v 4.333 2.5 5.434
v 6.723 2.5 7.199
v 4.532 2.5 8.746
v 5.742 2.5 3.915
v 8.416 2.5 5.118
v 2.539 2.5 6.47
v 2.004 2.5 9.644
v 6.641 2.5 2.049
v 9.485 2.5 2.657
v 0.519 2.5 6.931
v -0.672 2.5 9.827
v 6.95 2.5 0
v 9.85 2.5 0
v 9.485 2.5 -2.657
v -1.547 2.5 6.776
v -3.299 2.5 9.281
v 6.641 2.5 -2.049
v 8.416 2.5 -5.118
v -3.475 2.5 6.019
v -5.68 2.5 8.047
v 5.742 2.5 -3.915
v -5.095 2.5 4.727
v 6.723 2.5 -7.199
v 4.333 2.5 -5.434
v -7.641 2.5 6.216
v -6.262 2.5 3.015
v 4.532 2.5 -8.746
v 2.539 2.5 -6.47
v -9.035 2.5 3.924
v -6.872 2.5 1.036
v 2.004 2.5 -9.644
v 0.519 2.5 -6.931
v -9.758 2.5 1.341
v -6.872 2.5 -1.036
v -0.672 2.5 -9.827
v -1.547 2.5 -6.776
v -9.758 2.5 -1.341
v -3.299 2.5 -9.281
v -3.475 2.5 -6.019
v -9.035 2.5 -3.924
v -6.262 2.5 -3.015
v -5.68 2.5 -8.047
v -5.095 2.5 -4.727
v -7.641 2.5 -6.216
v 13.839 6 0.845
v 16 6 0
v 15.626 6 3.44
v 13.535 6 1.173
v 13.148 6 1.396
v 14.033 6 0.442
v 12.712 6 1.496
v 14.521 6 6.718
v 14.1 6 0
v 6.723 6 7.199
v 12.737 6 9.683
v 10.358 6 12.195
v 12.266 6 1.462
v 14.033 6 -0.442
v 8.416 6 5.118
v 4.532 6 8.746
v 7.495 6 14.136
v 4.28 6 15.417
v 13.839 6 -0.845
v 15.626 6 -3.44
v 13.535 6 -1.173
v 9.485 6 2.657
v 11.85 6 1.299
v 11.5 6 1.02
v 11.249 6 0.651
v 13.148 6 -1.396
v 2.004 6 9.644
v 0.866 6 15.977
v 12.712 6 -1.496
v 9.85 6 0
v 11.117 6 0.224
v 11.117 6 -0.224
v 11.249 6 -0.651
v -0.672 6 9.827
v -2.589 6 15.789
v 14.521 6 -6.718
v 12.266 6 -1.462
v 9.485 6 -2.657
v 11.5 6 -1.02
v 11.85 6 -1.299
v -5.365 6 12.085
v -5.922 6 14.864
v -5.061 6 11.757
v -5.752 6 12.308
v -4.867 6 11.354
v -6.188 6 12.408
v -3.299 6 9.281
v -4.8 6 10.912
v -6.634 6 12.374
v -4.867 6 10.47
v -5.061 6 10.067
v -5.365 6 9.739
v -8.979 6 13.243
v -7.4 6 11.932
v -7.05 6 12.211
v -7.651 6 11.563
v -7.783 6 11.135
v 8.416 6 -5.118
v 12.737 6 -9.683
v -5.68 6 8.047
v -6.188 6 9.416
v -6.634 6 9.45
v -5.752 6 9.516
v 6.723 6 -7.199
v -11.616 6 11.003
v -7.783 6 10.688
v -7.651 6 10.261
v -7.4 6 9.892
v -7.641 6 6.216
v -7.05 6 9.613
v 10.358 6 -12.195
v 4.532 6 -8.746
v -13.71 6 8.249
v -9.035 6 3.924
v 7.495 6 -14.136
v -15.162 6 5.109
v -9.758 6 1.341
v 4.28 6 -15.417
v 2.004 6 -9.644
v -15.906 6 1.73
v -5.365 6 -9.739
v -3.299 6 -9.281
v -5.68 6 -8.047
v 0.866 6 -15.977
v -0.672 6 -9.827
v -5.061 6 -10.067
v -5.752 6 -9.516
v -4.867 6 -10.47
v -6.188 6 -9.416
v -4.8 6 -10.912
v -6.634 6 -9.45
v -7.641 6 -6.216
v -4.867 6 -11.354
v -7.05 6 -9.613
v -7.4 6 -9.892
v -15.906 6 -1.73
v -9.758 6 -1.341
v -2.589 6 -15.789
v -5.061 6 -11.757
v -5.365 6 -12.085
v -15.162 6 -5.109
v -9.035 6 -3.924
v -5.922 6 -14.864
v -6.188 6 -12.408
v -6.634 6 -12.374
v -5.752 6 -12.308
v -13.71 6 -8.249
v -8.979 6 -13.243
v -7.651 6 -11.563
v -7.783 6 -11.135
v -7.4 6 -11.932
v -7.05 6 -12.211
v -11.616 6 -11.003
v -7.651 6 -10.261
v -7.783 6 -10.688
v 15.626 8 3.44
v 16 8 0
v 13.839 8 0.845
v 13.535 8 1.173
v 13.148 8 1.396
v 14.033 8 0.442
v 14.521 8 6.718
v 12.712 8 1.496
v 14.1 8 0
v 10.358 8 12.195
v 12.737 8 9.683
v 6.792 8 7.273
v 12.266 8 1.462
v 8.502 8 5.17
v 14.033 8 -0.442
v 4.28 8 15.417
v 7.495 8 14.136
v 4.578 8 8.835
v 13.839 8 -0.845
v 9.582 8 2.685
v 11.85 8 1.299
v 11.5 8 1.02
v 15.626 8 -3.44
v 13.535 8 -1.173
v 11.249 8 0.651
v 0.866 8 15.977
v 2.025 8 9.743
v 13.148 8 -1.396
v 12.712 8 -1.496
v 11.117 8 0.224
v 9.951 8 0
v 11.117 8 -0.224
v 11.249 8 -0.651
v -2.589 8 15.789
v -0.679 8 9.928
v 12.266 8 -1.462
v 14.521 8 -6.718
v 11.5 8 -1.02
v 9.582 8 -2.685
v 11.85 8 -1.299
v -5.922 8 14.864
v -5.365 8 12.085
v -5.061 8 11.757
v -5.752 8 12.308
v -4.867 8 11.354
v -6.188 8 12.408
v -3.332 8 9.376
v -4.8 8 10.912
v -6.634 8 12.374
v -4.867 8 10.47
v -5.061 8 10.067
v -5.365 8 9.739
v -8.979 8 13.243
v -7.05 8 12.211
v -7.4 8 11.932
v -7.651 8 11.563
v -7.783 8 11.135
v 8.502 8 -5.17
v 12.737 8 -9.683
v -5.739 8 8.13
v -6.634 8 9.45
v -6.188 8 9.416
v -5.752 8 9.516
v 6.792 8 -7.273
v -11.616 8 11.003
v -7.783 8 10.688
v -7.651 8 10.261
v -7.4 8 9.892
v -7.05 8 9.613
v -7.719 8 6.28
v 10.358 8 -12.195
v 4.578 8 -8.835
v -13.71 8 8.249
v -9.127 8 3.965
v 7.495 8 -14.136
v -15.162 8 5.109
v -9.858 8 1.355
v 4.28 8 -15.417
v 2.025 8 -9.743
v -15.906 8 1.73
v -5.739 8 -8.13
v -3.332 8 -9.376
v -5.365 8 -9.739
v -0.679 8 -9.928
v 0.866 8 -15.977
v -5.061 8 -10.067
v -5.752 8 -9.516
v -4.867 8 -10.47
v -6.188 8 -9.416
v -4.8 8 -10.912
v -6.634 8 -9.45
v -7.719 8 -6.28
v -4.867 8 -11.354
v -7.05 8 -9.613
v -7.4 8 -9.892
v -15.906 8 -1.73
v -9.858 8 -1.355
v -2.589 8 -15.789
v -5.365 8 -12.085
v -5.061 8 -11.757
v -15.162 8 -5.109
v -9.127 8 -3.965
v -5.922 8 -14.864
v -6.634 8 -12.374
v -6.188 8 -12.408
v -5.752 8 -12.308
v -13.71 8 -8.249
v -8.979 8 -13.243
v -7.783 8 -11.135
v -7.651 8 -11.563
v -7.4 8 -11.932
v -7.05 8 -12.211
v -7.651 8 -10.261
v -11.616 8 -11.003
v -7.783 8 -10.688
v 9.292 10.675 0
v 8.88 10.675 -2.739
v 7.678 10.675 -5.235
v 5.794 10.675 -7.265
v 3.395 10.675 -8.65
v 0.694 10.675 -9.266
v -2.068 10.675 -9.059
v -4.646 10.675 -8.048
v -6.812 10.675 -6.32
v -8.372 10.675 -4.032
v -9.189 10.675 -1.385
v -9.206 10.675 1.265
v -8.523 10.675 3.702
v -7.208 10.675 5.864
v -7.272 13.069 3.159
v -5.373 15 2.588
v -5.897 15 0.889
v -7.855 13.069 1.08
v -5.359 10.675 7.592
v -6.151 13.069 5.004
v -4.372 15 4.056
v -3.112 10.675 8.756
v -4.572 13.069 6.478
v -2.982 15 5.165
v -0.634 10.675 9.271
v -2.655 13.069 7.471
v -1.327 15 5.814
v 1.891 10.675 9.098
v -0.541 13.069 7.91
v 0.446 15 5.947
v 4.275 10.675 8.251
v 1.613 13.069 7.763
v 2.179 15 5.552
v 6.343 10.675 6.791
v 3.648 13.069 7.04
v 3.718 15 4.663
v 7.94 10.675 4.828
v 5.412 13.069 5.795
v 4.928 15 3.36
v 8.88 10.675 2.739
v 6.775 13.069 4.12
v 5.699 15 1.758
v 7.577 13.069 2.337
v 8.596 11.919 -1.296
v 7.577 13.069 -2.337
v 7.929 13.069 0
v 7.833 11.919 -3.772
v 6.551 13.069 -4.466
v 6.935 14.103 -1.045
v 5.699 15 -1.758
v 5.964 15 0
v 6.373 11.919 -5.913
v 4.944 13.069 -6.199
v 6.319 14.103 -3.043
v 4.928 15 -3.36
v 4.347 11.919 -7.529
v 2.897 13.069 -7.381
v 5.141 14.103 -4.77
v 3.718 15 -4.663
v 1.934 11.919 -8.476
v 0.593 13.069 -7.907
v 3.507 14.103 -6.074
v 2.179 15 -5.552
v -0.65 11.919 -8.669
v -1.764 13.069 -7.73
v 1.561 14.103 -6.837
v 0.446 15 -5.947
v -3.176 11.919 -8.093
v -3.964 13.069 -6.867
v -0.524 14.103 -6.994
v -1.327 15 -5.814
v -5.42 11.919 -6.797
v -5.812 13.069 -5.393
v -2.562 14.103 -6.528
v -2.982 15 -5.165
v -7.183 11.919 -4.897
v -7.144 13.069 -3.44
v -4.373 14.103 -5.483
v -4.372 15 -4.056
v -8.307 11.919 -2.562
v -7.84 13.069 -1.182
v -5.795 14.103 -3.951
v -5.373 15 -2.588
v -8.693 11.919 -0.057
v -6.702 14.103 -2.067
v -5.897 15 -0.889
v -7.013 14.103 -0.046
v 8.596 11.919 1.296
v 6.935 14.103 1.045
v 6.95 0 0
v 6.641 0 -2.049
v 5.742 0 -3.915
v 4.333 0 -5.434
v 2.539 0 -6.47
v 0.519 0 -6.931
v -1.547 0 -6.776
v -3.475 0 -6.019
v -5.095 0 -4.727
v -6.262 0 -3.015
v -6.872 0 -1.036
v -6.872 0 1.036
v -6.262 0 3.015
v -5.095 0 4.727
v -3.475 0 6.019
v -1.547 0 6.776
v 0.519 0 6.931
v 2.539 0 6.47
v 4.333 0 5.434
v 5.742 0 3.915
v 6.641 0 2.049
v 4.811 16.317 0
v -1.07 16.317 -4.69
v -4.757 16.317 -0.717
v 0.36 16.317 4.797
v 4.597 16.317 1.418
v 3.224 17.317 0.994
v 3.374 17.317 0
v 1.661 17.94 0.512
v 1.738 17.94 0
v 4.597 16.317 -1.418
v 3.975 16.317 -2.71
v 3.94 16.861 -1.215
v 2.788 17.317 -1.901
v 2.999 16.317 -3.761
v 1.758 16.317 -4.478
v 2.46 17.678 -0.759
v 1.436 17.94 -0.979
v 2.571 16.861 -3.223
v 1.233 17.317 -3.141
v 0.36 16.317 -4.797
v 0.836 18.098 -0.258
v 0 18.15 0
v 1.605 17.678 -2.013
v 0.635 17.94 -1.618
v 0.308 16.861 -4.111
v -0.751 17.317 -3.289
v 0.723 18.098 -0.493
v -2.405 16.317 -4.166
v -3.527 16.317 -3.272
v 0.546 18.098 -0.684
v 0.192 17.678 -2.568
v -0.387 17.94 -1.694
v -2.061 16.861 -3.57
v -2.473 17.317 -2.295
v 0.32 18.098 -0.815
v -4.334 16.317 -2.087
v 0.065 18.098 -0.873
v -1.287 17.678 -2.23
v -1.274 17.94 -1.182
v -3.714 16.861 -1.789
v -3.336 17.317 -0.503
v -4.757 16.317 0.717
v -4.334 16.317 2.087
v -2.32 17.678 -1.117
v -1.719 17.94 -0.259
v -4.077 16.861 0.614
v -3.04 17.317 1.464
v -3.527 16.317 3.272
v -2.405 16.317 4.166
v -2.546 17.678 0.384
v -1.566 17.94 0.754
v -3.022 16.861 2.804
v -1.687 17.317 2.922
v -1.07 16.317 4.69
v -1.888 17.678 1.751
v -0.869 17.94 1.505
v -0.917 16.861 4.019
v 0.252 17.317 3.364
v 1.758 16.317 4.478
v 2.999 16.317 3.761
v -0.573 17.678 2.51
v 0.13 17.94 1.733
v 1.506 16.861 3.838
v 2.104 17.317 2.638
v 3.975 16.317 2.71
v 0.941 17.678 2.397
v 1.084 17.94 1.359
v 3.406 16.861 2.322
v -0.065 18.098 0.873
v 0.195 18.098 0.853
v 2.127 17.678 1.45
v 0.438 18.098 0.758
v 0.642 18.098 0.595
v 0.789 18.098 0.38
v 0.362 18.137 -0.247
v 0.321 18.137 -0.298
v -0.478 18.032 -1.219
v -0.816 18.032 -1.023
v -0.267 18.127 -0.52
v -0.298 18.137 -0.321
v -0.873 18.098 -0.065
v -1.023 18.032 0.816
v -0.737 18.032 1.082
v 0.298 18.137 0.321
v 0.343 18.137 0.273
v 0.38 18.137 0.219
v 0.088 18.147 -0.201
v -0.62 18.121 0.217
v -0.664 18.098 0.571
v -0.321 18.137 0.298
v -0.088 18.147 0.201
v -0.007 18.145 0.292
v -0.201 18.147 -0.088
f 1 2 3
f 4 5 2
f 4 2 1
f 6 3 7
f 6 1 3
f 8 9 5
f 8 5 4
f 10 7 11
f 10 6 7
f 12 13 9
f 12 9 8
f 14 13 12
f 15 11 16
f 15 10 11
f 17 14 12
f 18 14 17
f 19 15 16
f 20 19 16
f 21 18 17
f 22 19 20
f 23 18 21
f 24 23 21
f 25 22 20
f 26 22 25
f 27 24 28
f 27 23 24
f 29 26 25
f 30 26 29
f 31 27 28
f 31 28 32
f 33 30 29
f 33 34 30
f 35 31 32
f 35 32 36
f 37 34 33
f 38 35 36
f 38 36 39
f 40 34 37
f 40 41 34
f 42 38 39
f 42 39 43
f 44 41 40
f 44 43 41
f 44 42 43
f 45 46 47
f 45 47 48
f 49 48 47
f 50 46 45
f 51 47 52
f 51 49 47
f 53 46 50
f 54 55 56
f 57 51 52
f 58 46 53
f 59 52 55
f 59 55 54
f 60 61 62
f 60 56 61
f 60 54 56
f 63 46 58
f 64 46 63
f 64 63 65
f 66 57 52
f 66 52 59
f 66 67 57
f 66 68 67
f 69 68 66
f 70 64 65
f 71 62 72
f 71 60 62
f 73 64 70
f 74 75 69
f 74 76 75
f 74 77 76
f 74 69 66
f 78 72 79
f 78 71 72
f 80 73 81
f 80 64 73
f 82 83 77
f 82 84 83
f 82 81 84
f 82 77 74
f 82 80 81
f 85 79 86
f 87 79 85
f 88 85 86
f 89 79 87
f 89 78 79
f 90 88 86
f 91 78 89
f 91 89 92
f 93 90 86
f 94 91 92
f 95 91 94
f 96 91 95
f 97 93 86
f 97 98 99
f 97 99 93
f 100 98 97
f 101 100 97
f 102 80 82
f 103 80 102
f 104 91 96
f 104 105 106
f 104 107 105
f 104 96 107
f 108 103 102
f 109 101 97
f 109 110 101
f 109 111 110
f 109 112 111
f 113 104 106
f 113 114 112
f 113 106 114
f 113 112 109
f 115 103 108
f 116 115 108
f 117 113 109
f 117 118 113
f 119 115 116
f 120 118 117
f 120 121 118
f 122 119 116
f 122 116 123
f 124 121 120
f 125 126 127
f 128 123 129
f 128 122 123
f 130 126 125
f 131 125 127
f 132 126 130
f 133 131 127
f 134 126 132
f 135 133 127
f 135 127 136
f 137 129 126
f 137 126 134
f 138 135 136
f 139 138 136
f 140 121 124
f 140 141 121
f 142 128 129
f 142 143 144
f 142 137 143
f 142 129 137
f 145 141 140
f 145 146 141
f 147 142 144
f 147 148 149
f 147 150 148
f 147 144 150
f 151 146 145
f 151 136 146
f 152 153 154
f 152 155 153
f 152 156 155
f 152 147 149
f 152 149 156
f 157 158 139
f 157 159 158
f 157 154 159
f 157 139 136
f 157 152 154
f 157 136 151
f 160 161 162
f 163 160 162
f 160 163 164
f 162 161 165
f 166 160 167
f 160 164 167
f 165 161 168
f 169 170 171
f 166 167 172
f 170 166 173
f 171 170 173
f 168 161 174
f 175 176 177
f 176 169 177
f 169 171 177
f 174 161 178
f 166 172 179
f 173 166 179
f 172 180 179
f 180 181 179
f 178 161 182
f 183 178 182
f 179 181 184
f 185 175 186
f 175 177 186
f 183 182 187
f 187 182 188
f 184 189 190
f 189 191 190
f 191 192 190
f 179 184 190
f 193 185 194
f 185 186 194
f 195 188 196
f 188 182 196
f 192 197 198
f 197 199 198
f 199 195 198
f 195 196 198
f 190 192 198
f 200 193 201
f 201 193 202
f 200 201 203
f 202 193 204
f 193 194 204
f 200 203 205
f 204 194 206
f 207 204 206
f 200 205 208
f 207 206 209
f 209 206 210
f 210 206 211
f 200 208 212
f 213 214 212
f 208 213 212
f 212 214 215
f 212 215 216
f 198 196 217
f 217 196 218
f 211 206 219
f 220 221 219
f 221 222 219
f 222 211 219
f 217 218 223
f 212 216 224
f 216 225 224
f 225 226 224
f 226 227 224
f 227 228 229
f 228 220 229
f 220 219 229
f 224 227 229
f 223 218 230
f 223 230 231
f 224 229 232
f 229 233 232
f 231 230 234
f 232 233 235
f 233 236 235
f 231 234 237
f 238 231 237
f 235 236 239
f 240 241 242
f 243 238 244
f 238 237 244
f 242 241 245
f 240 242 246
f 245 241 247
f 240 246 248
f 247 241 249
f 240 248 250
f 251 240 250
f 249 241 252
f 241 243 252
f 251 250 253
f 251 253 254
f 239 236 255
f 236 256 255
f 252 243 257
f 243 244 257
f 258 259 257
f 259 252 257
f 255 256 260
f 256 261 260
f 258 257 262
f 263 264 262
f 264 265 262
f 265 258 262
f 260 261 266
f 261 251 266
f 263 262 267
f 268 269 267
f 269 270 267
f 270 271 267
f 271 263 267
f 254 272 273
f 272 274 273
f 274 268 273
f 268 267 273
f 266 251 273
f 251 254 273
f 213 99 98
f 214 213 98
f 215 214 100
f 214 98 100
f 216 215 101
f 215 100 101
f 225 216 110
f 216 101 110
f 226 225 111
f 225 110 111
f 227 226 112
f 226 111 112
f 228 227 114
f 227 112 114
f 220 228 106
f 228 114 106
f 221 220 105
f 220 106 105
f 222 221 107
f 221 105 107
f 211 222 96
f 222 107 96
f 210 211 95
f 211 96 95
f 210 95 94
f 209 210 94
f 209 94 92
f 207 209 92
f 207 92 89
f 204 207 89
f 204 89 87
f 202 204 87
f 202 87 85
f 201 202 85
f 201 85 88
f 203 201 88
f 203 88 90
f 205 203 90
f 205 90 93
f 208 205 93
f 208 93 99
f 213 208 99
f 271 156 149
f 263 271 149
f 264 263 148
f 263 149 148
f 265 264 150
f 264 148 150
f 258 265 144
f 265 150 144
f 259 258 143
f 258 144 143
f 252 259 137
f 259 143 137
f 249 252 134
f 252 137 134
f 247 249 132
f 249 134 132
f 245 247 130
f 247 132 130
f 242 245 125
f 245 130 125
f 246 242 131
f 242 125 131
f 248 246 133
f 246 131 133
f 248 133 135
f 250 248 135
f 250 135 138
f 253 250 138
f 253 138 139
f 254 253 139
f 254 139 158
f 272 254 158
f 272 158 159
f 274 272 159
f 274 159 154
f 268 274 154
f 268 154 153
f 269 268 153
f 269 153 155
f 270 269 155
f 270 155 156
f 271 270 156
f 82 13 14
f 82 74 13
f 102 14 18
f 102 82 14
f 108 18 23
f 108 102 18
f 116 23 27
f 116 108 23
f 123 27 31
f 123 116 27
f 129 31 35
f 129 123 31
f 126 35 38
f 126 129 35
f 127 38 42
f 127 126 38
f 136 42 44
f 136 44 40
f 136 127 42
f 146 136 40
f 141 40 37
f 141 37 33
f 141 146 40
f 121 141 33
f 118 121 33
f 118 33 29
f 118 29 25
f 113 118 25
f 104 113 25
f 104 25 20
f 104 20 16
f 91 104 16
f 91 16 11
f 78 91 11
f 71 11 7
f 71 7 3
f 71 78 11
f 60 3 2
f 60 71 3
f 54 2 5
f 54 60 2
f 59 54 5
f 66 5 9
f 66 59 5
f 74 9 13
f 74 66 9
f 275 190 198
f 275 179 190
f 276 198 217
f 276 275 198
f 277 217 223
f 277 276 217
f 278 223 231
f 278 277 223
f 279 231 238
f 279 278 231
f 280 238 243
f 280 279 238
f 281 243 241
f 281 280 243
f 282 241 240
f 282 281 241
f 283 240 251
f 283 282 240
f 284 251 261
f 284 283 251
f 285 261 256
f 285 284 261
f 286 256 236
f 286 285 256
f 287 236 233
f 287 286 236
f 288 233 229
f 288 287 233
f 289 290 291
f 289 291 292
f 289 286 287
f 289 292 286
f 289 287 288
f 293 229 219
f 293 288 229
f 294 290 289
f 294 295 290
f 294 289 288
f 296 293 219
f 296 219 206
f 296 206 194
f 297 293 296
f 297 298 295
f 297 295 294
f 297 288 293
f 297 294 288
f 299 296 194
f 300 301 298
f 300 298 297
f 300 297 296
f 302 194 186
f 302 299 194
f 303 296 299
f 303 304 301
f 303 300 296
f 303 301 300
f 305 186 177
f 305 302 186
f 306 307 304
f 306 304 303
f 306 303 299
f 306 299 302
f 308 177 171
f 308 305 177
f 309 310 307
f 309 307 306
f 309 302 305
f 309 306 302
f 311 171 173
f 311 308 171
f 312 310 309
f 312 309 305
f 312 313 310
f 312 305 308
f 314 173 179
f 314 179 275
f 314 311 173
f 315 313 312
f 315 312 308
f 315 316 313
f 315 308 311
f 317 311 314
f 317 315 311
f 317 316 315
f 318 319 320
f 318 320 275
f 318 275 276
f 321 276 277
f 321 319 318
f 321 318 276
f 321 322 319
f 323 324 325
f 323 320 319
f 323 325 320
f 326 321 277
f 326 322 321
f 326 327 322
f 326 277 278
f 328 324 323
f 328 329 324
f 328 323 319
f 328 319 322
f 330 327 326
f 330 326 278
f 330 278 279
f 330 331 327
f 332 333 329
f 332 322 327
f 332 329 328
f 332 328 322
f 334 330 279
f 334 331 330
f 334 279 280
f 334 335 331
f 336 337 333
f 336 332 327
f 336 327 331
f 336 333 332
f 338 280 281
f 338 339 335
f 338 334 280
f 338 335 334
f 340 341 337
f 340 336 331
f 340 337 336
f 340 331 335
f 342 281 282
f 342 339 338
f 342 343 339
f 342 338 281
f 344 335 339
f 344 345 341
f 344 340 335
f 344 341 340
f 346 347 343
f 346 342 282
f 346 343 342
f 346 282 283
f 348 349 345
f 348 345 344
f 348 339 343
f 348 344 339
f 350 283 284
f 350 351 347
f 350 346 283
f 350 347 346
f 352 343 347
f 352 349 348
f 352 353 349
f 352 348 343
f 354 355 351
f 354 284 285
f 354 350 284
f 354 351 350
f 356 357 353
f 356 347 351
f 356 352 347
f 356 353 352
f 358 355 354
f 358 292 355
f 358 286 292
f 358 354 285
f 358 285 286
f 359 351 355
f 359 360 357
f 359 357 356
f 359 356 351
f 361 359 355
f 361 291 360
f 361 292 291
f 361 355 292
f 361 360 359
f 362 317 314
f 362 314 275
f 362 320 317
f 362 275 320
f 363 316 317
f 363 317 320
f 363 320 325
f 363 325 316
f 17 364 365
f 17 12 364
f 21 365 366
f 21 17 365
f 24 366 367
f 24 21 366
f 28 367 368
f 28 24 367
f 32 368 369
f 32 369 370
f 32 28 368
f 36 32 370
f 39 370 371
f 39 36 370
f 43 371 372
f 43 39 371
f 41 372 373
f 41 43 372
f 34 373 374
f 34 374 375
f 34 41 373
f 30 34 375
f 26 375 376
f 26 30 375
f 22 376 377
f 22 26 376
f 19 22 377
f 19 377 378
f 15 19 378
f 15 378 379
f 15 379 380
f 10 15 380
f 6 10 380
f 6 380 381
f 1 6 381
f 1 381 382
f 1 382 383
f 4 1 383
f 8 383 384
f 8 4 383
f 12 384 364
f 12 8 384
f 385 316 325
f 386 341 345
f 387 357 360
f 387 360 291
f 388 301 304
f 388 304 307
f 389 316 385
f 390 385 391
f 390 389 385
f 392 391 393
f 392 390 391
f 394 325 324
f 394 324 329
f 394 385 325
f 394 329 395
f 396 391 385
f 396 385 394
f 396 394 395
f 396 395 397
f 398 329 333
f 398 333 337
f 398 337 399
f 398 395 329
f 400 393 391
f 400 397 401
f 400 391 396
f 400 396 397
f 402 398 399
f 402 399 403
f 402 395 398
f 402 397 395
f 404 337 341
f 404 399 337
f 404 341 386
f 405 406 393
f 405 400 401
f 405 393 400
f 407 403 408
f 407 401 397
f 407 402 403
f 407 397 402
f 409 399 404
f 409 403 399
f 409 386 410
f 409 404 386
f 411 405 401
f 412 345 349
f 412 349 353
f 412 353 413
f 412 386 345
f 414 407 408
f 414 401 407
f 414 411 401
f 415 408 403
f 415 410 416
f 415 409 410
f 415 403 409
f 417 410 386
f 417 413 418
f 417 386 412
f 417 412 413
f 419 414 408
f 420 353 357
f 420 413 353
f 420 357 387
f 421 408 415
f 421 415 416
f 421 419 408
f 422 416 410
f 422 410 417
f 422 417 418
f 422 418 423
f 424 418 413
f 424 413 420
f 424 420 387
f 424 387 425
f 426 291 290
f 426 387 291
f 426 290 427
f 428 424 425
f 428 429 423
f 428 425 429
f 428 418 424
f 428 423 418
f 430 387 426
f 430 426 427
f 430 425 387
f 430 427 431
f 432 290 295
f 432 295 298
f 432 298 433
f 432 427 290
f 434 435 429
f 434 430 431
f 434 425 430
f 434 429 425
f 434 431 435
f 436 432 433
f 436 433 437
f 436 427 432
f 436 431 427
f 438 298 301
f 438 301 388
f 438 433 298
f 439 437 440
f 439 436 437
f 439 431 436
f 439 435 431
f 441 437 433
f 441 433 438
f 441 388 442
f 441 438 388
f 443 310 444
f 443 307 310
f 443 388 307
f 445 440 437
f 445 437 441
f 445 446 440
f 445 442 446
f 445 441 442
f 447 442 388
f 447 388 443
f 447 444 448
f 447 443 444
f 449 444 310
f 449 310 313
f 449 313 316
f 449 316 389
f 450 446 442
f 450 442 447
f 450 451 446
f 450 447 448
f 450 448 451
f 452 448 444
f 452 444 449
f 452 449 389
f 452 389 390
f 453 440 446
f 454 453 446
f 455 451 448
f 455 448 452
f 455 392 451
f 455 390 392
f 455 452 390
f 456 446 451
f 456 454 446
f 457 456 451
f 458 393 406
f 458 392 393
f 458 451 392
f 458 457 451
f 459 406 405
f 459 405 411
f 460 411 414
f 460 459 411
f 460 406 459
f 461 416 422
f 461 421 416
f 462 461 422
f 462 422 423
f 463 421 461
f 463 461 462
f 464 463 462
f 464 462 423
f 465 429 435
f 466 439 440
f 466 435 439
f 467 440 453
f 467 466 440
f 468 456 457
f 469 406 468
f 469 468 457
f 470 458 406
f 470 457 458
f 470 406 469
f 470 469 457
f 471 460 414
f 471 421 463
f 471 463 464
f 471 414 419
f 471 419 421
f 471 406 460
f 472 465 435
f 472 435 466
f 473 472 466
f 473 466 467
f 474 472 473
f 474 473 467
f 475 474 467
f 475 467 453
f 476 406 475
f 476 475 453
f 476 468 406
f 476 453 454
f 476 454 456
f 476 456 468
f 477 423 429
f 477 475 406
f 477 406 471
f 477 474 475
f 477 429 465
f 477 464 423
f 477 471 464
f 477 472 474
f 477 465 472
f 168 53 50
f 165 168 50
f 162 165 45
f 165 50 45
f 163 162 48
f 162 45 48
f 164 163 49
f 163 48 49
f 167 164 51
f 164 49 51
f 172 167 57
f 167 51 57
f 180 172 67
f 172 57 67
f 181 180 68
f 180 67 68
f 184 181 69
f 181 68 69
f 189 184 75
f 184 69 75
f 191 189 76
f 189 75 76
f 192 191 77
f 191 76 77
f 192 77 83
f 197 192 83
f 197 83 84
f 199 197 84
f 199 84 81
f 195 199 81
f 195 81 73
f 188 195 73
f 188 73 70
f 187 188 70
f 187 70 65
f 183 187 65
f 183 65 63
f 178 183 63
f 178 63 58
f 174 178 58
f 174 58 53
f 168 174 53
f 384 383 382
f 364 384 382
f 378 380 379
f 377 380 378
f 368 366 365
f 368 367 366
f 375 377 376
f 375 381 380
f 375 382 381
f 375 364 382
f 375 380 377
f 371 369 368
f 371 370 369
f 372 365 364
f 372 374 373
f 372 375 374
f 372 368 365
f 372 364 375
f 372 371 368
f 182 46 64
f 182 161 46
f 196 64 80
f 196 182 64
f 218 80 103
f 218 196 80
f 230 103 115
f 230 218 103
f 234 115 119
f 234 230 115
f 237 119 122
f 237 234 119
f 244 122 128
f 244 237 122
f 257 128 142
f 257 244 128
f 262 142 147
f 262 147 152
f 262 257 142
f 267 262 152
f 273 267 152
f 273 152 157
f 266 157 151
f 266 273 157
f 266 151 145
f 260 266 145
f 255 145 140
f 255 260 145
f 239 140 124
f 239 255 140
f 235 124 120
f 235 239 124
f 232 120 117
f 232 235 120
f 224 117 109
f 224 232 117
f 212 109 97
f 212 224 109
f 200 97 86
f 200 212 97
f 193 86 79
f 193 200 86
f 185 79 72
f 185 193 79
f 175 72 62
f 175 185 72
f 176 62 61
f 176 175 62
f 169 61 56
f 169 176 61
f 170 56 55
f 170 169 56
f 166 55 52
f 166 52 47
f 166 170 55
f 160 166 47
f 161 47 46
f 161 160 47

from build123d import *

# Parameters (mm, degrees)
SKETCH001_R        = 1.5
POCKET_DEPTH       = 109.668659
POLARPATTERN_COUNT = 3


with BuildPart() as part:
    # Sketch → Revolution (revolve)
    with BuildSketch(Plane.XY):
        with BuildLine():
            Line((0, 0), (0, 18.15))
            ThreePointArc((5.96381, 15), (3.373784, 17.316935), (0, 18.15))
            ThreePointArc((9.951065, 8), (8.693509, 11.919272), (5.96381, 15))
            Line((9.951065, 8), (16, 8))
            Line((16, 6), (16, 8))
            Line((9.85, 6), (16, 6))
            Line((9.85, 2.5), (9.85, 6))
            Line((6.95, 2.5), (9.85, 2.5))
            Line((6.95, 0), (6.95, 2.5))
            Line((0, 0), (6.95, 0))
        make_face()
    revolve(axis=Axis((0, 0, 0), (0, 1, 0)))

    # Sketch001 → Pocket (cut, through all)
    with BuildSketch(Plane.XZ.offset(-6)):
        with Locations((12.6, 0)):
            Circle(SKETCH001_R)
    pocket = extrude(amount=-POCKET_DEPTH, mode=Mode.SUBTRACT)

    # PolarPattern: Pocket ×3 about axis
    polarpattern_axis = Axis((0, 6, 0), (0, -1, 0))
    for i in range(1, POLARPATTERN_COUNT):
        add(pocket.rotate(polarpattern_axis, i * 360 / POLARPATTERN_COUNT), mode=Mode.SUBTRACT)


solid = part.part
